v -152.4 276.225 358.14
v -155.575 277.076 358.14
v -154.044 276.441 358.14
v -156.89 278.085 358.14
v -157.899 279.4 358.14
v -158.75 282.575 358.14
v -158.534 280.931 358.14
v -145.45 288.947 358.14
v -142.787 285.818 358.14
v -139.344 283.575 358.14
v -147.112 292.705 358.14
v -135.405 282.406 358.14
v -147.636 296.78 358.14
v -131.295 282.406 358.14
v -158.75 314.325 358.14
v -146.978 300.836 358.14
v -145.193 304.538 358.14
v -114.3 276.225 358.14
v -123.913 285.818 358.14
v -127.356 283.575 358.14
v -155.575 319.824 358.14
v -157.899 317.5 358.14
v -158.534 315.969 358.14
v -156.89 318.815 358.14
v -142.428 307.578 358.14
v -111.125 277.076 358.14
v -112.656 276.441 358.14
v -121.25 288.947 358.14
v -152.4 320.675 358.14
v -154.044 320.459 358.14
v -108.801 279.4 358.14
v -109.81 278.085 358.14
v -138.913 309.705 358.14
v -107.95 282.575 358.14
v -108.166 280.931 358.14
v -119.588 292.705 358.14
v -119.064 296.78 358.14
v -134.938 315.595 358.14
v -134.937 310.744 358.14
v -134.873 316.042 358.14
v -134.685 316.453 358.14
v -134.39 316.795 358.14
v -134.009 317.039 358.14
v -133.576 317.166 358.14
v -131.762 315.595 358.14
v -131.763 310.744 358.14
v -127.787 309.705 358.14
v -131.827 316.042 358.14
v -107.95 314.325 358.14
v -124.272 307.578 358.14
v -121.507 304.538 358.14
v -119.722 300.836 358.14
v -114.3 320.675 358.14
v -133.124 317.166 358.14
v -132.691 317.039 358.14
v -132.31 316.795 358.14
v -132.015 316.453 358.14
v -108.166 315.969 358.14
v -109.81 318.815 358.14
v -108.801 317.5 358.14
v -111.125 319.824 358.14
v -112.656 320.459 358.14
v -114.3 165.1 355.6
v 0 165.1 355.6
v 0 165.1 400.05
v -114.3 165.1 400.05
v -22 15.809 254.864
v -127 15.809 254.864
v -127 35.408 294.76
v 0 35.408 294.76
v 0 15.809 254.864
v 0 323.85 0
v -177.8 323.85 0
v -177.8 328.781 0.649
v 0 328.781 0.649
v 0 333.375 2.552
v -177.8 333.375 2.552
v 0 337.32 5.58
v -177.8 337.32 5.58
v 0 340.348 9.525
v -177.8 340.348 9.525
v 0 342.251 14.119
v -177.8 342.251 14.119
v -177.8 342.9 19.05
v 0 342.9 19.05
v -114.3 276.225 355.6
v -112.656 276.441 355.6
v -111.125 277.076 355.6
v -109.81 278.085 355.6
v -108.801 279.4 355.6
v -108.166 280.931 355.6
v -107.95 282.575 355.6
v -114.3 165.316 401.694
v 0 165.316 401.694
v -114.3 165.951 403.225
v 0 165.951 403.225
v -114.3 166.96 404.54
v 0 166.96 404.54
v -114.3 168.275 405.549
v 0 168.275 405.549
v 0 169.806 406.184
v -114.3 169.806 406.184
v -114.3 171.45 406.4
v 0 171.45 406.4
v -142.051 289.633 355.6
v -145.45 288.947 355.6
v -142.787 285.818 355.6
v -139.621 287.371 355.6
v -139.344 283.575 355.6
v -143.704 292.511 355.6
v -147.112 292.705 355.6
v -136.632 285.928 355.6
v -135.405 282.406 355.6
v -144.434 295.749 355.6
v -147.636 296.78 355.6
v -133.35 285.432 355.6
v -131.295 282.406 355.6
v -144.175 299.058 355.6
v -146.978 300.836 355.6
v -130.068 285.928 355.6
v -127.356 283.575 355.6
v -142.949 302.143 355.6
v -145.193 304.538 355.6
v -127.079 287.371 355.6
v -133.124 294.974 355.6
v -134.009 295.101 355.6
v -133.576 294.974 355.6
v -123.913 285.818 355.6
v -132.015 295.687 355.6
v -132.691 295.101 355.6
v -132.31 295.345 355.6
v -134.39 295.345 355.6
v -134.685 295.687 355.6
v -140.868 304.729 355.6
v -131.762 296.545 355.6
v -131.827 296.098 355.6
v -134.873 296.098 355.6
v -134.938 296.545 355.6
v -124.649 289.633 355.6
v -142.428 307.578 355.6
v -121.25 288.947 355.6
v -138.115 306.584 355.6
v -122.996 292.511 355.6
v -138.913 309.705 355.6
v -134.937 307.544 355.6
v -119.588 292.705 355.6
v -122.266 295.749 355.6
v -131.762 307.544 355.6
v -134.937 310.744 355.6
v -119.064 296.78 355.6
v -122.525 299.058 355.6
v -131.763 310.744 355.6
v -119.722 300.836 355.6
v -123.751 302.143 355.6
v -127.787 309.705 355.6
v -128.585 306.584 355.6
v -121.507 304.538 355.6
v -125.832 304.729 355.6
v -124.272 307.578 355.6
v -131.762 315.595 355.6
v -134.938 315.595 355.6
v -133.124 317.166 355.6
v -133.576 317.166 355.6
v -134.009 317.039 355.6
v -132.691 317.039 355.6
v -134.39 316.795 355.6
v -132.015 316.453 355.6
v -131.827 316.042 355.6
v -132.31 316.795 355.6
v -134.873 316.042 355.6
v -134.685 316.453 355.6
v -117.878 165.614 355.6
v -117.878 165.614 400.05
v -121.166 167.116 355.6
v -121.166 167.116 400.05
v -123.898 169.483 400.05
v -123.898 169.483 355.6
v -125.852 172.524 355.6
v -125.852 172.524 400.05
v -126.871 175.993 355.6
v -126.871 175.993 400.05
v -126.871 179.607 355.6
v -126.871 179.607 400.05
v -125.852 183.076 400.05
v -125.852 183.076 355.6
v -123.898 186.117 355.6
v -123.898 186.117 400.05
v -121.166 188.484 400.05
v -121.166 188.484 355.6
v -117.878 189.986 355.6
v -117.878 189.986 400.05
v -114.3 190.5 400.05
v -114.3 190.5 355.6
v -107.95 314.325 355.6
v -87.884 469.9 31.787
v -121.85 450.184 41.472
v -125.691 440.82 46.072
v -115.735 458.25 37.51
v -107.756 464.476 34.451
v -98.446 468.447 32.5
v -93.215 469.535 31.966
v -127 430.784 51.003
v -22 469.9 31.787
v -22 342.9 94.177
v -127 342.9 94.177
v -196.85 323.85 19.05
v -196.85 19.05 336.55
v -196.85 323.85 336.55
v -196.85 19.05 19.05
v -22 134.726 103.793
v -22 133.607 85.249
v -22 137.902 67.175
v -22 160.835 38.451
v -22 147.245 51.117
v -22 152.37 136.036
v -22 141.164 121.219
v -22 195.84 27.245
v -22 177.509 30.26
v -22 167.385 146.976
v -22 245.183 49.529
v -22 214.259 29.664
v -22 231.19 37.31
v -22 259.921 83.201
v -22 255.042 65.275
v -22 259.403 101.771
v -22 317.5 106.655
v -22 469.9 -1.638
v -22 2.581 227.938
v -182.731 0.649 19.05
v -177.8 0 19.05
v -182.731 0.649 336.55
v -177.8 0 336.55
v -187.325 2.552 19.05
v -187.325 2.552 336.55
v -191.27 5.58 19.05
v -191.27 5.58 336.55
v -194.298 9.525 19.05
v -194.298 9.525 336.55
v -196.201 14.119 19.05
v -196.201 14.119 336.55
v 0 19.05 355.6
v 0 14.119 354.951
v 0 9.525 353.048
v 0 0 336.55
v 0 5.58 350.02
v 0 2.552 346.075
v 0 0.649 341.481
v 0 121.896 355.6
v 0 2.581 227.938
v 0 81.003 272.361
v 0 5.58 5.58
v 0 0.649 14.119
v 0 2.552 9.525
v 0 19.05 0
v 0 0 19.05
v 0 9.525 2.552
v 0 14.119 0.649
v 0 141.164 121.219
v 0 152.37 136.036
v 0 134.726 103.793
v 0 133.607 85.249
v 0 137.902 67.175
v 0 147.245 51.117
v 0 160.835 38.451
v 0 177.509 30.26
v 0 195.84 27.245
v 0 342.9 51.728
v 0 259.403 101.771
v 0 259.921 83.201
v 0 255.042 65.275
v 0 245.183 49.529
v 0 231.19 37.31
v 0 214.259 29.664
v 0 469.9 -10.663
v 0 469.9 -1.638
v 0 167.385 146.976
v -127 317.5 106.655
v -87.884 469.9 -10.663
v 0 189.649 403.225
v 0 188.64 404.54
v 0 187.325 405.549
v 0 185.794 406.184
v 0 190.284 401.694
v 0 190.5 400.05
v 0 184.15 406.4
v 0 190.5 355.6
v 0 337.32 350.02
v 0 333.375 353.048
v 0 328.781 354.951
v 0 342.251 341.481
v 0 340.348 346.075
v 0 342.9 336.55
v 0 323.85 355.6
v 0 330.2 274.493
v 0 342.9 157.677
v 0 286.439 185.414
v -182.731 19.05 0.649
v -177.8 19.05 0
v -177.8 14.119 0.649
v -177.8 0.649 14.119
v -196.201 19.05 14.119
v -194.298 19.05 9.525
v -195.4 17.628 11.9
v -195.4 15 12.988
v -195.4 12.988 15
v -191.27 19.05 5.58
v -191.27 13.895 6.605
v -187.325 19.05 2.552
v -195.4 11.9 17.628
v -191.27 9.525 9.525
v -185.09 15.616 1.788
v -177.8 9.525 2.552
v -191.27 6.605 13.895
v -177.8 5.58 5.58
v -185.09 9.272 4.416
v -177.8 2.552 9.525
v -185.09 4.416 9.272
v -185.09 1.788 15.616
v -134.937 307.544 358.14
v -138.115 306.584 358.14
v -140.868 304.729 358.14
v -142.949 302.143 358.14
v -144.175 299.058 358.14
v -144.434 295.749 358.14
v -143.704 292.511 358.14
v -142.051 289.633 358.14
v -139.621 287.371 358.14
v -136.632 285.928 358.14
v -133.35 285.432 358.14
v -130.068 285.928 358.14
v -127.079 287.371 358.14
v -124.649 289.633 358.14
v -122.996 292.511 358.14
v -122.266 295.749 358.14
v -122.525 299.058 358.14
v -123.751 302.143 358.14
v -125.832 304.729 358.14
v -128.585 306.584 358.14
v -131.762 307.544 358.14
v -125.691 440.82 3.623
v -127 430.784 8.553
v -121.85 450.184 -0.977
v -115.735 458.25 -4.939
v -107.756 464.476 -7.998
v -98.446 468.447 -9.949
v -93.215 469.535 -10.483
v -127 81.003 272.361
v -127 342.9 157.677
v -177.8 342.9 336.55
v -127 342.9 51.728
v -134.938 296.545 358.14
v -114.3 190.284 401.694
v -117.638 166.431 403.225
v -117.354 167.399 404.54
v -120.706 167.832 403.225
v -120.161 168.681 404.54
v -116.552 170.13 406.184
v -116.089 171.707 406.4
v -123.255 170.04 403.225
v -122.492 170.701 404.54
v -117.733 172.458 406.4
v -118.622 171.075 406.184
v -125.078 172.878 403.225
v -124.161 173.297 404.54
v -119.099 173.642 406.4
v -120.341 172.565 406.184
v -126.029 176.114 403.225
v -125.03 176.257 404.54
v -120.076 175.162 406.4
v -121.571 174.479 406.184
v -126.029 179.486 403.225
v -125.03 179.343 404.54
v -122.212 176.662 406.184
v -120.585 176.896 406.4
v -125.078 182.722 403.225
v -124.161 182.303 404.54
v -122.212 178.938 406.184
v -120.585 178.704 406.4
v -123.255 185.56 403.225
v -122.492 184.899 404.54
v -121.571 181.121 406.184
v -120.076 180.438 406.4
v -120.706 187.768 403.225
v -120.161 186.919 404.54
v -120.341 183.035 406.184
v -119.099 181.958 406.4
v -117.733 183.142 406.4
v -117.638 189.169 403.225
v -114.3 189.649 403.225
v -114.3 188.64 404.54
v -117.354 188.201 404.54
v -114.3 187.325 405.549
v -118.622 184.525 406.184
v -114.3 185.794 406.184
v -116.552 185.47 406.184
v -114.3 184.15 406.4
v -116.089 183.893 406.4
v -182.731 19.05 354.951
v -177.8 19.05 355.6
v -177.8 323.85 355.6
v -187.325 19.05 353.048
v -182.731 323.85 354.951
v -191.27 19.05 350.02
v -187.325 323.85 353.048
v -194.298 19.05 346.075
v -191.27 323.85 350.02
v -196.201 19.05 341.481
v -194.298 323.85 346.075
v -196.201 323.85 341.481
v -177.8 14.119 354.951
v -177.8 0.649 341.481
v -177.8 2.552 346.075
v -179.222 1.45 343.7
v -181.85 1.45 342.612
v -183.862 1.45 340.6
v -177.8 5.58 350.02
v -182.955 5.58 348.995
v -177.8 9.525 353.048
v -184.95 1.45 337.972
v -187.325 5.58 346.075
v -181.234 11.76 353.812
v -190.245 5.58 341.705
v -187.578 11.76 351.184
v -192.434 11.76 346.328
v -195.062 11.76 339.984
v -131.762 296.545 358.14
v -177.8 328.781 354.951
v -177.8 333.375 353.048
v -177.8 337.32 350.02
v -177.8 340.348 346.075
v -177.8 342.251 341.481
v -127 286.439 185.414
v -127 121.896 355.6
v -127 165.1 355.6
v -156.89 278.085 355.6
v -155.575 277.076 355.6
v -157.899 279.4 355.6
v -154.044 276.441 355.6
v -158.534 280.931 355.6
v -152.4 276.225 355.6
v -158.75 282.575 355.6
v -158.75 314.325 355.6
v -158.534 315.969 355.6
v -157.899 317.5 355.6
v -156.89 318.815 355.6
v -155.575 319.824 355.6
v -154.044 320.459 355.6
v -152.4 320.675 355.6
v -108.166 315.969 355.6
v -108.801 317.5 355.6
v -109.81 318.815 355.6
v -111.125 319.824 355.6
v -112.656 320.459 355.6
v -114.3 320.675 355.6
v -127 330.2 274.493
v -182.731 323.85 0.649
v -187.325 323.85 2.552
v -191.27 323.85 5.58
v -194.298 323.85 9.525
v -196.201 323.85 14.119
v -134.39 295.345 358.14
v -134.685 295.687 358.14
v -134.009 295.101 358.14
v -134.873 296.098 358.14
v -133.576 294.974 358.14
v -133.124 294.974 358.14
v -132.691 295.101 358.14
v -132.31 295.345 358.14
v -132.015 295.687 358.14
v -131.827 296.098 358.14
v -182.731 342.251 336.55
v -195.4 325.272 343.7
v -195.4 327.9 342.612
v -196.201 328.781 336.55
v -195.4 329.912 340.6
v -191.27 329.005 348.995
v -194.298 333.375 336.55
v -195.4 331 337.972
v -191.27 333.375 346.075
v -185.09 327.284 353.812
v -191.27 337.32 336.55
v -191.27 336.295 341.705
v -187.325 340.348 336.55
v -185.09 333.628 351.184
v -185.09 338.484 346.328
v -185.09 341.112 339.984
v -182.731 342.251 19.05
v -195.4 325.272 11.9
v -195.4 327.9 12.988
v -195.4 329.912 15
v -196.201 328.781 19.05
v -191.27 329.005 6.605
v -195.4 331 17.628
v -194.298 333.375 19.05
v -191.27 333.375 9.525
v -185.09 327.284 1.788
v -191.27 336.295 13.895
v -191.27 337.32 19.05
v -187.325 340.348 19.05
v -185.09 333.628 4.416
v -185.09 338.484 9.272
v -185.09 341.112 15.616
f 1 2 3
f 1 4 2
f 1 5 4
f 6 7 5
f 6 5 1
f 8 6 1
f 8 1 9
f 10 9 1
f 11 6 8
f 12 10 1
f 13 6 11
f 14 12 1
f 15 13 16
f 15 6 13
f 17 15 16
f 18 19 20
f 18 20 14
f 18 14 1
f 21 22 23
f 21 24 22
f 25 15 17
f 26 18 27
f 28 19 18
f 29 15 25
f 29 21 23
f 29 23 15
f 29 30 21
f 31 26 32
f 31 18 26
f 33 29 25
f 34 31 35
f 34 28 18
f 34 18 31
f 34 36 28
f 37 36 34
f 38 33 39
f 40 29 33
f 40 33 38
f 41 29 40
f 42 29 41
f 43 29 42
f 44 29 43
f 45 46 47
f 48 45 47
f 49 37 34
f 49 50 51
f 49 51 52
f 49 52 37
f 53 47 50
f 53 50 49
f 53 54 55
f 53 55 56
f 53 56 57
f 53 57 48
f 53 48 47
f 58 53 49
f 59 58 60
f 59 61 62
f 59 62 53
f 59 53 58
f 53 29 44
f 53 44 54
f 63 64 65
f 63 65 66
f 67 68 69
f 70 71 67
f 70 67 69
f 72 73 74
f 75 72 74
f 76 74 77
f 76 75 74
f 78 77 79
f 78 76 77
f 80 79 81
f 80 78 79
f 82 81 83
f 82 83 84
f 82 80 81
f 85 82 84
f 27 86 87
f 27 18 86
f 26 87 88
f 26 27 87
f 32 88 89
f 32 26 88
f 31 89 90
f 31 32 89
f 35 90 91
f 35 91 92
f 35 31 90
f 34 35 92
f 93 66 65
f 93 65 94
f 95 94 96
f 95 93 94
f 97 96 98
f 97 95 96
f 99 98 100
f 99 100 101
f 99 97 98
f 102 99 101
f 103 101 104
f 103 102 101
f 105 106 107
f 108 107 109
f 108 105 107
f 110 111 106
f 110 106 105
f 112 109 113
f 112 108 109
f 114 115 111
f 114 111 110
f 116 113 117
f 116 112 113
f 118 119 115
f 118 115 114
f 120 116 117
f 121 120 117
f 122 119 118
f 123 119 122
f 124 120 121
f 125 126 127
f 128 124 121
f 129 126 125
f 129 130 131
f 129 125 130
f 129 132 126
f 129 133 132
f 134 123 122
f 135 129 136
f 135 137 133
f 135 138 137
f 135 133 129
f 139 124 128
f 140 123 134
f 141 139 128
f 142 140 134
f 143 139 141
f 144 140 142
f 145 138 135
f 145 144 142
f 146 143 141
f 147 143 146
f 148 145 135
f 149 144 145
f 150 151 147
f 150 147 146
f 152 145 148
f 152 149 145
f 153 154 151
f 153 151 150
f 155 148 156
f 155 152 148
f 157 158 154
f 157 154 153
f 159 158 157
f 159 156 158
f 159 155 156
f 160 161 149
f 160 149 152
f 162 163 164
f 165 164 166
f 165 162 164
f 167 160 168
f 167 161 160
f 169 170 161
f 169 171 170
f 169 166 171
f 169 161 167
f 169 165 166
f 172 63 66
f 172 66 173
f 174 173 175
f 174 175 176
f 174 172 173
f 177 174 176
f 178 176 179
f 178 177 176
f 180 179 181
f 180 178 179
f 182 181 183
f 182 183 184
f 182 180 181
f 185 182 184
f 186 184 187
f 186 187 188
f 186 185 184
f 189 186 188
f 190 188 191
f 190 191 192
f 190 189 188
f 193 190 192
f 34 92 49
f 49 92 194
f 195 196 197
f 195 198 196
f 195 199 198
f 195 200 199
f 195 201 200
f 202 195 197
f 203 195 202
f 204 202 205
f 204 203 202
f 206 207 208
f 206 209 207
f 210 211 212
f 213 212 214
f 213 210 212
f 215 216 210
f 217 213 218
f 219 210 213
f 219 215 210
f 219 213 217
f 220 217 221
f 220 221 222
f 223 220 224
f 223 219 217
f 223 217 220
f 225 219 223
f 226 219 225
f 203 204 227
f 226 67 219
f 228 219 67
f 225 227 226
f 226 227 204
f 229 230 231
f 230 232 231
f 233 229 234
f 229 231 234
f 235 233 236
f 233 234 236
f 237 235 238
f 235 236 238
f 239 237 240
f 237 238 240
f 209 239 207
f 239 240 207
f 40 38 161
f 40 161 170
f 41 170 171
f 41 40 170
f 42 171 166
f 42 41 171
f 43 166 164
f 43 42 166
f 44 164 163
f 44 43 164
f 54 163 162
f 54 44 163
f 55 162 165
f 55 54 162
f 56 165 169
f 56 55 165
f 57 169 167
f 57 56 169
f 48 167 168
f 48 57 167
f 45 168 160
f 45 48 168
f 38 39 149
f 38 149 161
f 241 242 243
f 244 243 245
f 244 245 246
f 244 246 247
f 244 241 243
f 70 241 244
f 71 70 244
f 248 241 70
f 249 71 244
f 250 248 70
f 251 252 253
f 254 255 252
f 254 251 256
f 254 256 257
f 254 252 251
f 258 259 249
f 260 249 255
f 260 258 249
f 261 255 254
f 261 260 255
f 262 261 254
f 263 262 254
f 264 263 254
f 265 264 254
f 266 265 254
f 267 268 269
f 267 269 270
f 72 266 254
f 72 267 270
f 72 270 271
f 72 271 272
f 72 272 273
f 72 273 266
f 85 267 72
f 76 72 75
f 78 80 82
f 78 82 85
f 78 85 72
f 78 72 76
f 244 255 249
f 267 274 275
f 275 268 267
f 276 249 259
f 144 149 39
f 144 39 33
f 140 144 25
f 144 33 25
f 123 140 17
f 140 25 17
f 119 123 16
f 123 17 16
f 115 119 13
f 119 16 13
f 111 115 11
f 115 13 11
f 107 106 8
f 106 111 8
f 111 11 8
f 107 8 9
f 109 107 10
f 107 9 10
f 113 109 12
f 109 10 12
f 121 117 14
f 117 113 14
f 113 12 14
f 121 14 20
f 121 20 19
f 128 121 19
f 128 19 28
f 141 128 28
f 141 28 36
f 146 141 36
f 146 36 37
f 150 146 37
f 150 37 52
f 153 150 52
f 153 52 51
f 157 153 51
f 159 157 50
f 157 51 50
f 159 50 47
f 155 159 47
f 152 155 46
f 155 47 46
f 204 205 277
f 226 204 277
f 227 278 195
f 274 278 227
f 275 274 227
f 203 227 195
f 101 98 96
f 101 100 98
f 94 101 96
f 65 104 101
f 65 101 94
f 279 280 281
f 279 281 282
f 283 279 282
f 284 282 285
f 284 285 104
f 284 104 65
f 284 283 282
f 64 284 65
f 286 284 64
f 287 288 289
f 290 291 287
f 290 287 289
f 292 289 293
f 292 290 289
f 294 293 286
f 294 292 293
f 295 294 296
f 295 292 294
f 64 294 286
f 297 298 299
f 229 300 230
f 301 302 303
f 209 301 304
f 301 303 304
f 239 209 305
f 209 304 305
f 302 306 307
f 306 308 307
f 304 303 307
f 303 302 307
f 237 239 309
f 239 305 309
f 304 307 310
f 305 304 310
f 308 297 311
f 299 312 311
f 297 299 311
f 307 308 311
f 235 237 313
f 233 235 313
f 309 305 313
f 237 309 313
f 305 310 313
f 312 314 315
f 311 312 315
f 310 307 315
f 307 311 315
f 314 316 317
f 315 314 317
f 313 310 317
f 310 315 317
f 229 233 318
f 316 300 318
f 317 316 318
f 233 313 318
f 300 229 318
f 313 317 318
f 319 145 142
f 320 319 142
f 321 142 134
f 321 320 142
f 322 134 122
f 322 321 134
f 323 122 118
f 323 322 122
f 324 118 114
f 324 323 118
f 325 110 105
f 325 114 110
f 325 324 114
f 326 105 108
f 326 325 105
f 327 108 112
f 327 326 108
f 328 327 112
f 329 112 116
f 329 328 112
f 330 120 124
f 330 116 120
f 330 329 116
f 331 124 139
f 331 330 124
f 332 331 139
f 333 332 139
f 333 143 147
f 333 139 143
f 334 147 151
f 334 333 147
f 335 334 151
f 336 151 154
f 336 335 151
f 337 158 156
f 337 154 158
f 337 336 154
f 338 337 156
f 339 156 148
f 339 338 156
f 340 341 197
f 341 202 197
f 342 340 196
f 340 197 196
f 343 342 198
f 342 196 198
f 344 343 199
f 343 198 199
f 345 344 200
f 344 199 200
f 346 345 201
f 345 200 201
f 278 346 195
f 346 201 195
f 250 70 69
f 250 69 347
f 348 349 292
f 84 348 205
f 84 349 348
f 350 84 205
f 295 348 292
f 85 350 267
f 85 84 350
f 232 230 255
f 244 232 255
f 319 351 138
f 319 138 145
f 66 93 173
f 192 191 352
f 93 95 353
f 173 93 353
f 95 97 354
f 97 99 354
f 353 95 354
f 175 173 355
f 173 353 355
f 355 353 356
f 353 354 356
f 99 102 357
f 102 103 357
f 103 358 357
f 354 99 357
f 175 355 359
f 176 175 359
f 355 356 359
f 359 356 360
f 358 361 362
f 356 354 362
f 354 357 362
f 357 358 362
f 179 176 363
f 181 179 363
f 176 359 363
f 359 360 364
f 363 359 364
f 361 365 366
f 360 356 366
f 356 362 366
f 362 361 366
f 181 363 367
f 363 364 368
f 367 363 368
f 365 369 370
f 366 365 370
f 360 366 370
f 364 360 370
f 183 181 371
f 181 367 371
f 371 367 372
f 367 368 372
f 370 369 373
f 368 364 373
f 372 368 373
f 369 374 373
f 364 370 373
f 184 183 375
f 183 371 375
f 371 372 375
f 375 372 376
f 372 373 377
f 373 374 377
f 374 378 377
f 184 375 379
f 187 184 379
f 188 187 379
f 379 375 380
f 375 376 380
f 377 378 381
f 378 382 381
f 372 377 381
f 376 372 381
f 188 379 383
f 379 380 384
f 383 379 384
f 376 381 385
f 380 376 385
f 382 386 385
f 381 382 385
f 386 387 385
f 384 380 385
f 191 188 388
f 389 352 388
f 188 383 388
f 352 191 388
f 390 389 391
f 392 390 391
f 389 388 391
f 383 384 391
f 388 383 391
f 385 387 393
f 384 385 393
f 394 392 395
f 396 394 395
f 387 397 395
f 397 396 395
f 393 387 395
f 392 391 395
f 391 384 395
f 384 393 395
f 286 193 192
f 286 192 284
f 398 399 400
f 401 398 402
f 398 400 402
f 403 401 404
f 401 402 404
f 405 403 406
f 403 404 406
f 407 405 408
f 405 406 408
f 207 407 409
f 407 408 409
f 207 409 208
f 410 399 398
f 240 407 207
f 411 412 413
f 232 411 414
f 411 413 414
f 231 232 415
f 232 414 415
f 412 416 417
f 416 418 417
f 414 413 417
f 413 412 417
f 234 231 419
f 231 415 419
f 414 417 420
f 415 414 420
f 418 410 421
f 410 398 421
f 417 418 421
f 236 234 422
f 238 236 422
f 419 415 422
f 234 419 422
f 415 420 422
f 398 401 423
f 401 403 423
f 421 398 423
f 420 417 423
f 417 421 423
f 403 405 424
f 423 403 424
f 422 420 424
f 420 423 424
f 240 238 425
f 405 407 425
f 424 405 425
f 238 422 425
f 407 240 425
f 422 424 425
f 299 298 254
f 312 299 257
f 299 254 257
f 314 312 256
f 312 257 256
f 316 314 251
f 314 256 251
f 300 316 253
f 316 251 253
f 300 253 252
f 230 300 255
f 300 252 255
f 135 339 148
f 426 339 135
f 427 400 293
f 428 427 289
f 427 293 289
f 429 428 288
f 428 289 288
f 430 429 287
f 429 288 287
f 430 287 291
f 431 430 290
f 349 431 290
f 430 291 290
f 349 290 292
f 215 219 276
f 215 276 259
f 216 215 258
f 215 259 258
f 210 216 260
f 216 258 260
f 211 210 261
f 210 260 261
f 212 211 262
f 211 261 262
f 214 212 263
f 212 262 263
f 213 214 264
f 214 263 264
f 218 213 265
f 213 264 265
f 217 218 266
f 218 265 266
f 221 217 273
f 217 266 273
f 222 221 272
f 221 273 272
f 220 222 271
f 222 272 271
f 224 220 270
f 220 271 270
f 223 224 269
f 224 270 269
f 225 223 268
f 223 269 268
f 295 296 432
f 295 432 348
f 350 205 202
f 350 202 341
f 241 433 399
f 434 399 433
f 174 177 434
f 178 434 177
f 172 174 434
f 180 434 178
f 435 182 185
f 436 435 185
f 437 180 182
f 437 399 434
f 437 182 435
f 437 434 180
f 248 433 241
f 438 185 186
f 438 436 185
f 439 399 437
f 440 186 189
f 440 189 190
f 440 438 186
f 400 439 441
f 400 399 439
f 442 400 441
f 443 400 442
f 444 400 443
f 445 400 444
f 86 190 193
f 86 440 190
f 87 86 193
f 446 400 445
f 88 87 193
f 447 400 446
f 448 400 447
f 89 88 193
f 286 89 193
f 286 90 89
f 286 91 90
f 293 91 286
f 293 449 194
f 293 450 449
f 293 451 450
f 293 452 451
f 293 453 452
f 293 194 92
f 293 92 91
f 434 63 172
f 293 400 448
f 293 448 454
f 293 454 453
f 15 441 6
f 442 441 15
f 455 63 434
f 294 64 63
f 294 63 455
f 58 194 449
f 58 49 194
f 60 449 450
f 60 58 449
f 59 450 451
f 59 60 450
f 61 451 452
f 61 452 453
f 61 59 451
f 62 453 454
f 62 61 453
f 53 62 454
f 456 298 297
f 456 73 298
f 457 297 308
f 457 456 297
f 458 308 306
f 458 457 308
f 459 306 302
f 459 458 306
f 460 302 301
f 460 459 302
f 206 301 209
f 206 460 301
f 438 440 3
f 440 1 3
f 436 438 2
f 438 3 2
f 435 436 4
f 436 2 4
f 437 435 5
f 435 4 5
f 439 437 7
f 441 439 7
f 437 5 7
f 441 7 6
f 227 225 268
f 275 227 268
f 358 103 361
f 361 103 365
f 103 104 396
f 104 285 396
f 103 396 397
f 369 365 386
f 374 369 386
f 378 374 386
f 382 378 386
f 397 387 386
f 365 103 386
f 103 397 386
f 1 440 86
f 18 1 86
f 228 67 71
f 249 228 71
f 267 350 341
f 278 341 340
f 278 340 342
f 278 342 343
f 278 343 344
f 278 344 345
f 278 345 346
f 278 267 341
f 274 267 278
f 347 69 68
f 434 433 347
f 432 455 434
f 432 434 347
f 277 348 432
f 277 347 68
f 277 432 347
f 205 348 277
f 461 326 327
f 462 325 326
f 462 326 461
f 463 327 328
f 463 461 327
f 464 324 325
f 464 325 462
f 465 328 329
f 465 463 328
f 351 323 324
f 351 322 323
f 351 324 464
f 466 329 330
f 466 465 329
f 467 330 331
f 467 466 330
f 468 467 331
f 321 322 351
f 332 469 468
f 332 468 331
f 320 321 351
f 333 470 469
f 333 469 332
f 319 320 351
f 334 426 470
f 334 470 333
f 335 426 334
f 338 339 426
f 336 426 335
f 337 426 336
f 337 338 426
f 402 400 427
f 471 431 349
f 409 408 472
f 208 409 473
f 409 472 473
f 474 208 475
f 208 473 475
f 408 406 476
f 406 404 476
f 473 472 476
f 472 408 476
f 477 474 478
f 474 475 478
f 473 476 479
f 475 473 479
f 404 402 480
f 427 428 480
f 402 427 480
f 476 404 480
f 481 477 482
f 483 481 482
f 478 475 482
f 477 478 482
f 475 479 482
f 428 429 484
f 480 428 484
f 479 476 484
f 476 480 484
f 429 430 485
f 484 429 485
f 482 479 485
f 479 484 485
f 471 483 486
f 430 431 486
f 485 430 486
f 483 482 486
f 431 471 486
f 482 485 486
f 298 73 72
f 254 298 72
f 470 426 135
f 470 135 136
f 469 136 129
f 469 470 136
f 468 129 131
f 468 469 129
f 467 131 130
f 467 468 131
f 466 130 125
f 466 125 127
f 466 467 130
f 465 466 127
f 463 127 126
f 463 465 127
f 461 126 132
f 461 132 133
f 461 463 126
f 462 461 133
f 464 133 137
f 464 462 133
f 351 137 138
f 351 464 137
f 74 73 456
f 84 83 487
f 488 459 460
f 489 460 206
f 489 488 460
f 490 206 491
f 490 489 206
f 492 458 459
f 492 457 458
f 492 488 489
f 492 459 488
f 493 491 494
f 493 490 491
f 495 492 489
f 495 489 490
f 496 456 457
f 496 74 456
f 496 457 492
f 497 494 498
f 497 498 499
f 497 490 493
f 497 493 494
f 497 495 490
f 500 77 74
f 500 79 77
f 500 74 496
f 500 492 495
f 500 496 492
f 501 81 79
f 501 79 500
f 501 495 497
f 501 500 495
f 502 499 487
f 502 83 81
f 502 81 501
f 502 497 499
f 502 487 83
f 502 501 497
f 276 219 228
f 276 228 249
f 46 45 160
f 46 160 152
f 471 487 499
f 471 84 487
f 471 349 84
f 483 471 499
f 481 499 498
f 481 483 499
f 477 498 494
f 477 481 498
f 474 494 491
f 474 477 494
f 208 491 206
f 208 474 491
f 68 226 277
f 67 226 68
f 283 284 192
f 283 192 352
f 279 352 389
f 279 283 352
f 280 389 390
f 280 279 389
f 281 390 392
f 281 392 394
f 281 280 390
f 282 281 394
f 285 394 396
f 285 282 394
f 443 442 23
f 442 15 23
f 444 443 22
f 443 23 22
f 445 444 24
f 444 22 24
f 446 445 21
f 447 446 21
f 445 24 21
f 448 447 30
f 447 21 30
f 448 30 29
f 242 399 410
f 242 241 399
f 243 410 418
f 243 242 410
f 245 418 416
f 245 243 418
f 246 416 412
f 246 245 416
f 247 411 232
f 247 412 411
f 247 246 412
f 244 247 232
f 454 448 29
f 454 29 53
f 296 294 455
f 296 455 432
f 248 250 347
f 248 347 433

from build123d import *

# Parameters (mm, degrees)
SKETCH1_W           = 393.7
SKETCH1_H           = 342.9
BOSS_EXTRUDE1_DEPTH = 355.6
SKETCH2_W           = 50.8
SKETCH2_H           = 44.45
BOSS_EXTRUDE2_DEPTH = 2.54
BOSS_EXTRUDE3_DEPTH = 2.54
SKETCH4_R           = 3.81
CUT_EXTRUDE1_DEPTH  = 2.54
BOSS_EXTRUDE4_DEPTH = 50.8
FILLET1_R           = 6.35
FILLET2_R           = 6.35
SKETCH6_R           = 14.2875
SKETCH6_R_2         = 11.1125
CUT_EXTRUDE2_DEPTH  = 2.54
FILLET3_R           = 19.05
BOSS_EXTRUDE5_DEPTH = 127
FILLET4_R           = 39.116
SKETCH8_W           = 254
SKETCH8_H           = 63.5
CUT_EXTRUDE3_DEPTH  = 25.4
CUT_EXTRUDE4_DEPTH  = 652.703070808
CUT_EXTRUDE5_DEPTH  = 127
BOSS_EXTRUDE6_DEPTH = 127
SKETCH12_W          = 22
SKETCH12_H          = 524.644243645
CUT_EXTRUDE6_DEPTH  = 30
SKETCH13_R          = 63.5
CUT_EXTRUDE7_DEPTH  = 22


with BuildPart() as part:
    # Sketch1 → Boss-Extrude1 (new body)
    with BuildSketch(Plane.XY):
        with Locations((0, 171.45)):
            Rectangle(SKETCH1_W, SKETCH1_H)
    extrude(amount=BOSS_EXTRUDE1_DEPTH)

    # Sketch2 → Boss-Extrude2 (add)
    with BuildSketch(Plane.XY.offset(355.6)):
        with Locations((-133.35, 298.45)):
            Rectangle(SKETCH2_W, SKETCH2_H)
    extrude(amount=BOSS_EXTRUDE2_DEPTH)

    # Sketch3 → Boss-Extrude3 (add)
    with BuildSketch(Plane.XY.offset(355.6)):
        with BuildLine():
            Line((88.9, 307.975), (165.1, 307.975))
            ThreePointArc((165.1, 307.975), (174.625, 298.45), (165.1, 288.925))
            Line((165.1, 288.925), (88.9, 288.925))
            ThreePointArc((88.9, 288.925), (79.375, 298.45), (88.9, 307.975))
        make_face()
    extrude(amount=BOSS_EXTRUDE3_DEPTH)

    # Sketch4 → Cut-Extrude1 (cut)
    with BuildSketch(Plane.XY.offset(358.14)):
        with Locations((92.075, 298.45)):
            Circle(SKETCH4_R)
        with Locations((108.286467636, 298.45)):
            Circle(SKETCH4_R)
        with Locations((124.497935272, 298.45)):
            Circle(SKETCH4_R)
    extrude(amount=-CUT_EXTRUDE1_DEPTH, mode=Mode.SUBTRACT)

    # Sketch5 → Boss-Extrude4 (add)
    with BuildSketch(Plane.XY.offset(355.6)):
        with BuildLine():
            Line((-114.3, 190.5), (114.3, 190.5))
            ThreePointArc((114.3, 190.5), (127, 177.8), (114.3, 165.1))
            Line((114.3, 165.1), (-114.3, 165.1))
            ThreePointArc((-114.3, 165.1), (-127, 177.8), (-114.3, 190.5))
        make_face()
    extrude(amount=BOSS_EXTRUDE4_DEPTH)

    # Fillet1
    fillet1_edges = [part.edges().sort_by_distance(p)[0] for p in [
        (-127, 177.8, 406.4),
        (0, 165.1, 406.4),
        (127, 177.8, 406.4),
        (0, 190.5, 406.4),
    ]]
    fillet(fillet1_edges, radius=FILLET1_R)

    # Fillet2
    fillet2_edges = [part.edges().sort_by_distance(p)[0] for p in [
        (-107.95, 276.225, 356.87),
        (-107.95, 320.675, 356.87),
        (-158.75, 320.675, 356.87),
        (-158.75, 276.225, 356.87),
    ]]
    fillet(fillet2_edges, radius=FILLET2_R)

    # Sketch6 → Cut-Extrude2 (cut)
    # profile 1 of 2: a face of its own
    with BuildSketch(Plane.XY.offset(358.14)):
        with Locations((-133.35, 296.545)):
            Circle(SKETCH6_R)
        with Locations((-133.35, 296.545)):
            Circle(SKETCH6_R_2, mode=Mode.SUBTRACT)
    # profile 2 of 2: a face of its own
    with BuildSketch(Plane.XY.offset(358.14)):
        with BuildLine():
            Line((-134.9375, 296.545), (-134.9375, 315.595))
            ThreePointArc((-134.9375, 315.595), (-133.35, 317.1825), (-131.7625, 315.595))
            Line((-131.7625, 315.595), (-131.7625, 296.545))
            ThreePointArc((-131.7625, 296.545), (-133.35, 294.9575), (-134.9375, 296.545))
        make_face()
    extrude(amount=-CUT_EXTRUDE2_DEPTH, mode=Mode.SUBTRACT)

    # Fillet3
    fillet3_edges = [part.edges().sort_by_distance(p)[0] for p in [
        (196.85, 171.45, 355.6),
        (0, 342.9, 355.6),
        (-196.85, 171.45, 355.6),
        (0, 342.9, 0),
        (196.85, 171.45, 0),
        (0, 0, 0),
        (-196.85, 171.45, 0),
        (0, 0, 355.6),
        (-196.85, 342.9, 177.8),
        (196.85, 342.9, 177.8),
        (196.85, 0, 177.8),
        (-196.85, 0, 177.8),
    ]]
    fillet(fillet3_edges, radius=FILLET3_R)

    # Sketch7 → Boss-Extrude5 (add, symmetric)
    with BuildSketch(Plane(origin=(0, 0, 0), x_dir=(0, 0, -1), z_dir=(1, 0, 0))):
        Polygon((-51.727584486, 342.9), (10.662740116, 469.9), (-31.786520589, 469.9), (-94.17684519, 342.9), align=None)
    extrude(amount=BOSS_EXTRUDE5_DEPTH, both=True)

    # Fillet4
    fillet4_edges = [part.edges().sort_by_distance(p)[0] for p in [
        (-127, 469.9, 10.561890237),
        (127, 469.9, 10.561890237),
    ]]
    fillet(fillet4_edges, radius=FILLET4_R)

    # Sketch8 → Cut-Extrude3 (cut)
    with BuildSketch(Plane(origin=(0, 342.9, 0), x_dir=(1, 0, 0), z_dir=(0, 1, 0))):
        with Locations((0, -125.92684519)):
            Rectangle(SKETCH8_W, SKETCH8_H)
    extrude(amount=-CUT_EXTRUDE3_DEPTH, mode=Mode.SUBTRACT)

    # Sketch9 → Cut-Extrude4 (cut, through all)
    with BuildSketch(Plane(origin=(0, 0, 0), x_dir=(0, 0, -1), z_dir=(1, 0, 0))):
        Polygon((-912.709368589, 769.44705767), (-210.006014515, -1175.153028305), (1122.715383104, 405.705970635), align=None)
    extrude(amount=CUT_EXTRUDE4_DEPTH, mode=Mode.SUBTRACT)

    # Sketch10 → Cut-Extrude5 (cut)
    with BuildSketch(Plane(origin=(0, 0, 0), x_dir=(0, 0, -1), z_dir=(1, 0, 0))):
        Polygon((-94.17684519, 342.9), (-254.864319987, 15.809069962), (-294.760067802, 35.408350722), (-272.360889792, 81.003491082), (-355.6, 121.895736006), (-355.6, 165.1), (-274.492578018, 330.2), (-185.41399178, 286.439040076), (-157.67684519, 342.9), align=None)
    extrude(amount=-CUT_EXTRUDE5_DEPTH, mode=Mode.SUBTRACT)

    # Sketch11 → Boss-Extrude6 (add)
    with BuildSketch(Plane(origin=(0, 0, 0), x_dir=(0, 0, -1), z_dir=(1, 0, 0))):
        Polygon((-94.17684519, 342.9), (-106.65491011, 317.5), (-94.17684519, 317.5), align=None)
    extrude(amount=-BOSS_EXTRUDE6_DEPTH)

    # Sketch12 → Cut-Extrude6 (cut)
    with BuildSketch(Plane(origin=(0, 103.936656142, 211.570550632), x_dir=(1, 0, 0), z_dir=(0, 0.4409287009906531, 0.8975421330738157))):
        with Locations((-11, 164.134434658)):
            Rectangle(SKETCH12_W, SKETCH12_H)
    extrude(amount=-CUT_EXTRUDE6_DEPTH, mode=Mode.SUBTRACT)

    # Sketch13 → Cut-Extrude7 (cut)
    with BuildSketch(Plane(origin=(0, 0, 0), x_dir=(0, 0, -1), z_dir=(1, 0, 0))):
        with Locations((-90.736174491, 196.869487567)):
            Circle(SKETCH13_R)
    extrude(amount=-CUT_EXTRUDE7_DEPTH, mode=Mode.SUBTRACT)


solid = part.part
